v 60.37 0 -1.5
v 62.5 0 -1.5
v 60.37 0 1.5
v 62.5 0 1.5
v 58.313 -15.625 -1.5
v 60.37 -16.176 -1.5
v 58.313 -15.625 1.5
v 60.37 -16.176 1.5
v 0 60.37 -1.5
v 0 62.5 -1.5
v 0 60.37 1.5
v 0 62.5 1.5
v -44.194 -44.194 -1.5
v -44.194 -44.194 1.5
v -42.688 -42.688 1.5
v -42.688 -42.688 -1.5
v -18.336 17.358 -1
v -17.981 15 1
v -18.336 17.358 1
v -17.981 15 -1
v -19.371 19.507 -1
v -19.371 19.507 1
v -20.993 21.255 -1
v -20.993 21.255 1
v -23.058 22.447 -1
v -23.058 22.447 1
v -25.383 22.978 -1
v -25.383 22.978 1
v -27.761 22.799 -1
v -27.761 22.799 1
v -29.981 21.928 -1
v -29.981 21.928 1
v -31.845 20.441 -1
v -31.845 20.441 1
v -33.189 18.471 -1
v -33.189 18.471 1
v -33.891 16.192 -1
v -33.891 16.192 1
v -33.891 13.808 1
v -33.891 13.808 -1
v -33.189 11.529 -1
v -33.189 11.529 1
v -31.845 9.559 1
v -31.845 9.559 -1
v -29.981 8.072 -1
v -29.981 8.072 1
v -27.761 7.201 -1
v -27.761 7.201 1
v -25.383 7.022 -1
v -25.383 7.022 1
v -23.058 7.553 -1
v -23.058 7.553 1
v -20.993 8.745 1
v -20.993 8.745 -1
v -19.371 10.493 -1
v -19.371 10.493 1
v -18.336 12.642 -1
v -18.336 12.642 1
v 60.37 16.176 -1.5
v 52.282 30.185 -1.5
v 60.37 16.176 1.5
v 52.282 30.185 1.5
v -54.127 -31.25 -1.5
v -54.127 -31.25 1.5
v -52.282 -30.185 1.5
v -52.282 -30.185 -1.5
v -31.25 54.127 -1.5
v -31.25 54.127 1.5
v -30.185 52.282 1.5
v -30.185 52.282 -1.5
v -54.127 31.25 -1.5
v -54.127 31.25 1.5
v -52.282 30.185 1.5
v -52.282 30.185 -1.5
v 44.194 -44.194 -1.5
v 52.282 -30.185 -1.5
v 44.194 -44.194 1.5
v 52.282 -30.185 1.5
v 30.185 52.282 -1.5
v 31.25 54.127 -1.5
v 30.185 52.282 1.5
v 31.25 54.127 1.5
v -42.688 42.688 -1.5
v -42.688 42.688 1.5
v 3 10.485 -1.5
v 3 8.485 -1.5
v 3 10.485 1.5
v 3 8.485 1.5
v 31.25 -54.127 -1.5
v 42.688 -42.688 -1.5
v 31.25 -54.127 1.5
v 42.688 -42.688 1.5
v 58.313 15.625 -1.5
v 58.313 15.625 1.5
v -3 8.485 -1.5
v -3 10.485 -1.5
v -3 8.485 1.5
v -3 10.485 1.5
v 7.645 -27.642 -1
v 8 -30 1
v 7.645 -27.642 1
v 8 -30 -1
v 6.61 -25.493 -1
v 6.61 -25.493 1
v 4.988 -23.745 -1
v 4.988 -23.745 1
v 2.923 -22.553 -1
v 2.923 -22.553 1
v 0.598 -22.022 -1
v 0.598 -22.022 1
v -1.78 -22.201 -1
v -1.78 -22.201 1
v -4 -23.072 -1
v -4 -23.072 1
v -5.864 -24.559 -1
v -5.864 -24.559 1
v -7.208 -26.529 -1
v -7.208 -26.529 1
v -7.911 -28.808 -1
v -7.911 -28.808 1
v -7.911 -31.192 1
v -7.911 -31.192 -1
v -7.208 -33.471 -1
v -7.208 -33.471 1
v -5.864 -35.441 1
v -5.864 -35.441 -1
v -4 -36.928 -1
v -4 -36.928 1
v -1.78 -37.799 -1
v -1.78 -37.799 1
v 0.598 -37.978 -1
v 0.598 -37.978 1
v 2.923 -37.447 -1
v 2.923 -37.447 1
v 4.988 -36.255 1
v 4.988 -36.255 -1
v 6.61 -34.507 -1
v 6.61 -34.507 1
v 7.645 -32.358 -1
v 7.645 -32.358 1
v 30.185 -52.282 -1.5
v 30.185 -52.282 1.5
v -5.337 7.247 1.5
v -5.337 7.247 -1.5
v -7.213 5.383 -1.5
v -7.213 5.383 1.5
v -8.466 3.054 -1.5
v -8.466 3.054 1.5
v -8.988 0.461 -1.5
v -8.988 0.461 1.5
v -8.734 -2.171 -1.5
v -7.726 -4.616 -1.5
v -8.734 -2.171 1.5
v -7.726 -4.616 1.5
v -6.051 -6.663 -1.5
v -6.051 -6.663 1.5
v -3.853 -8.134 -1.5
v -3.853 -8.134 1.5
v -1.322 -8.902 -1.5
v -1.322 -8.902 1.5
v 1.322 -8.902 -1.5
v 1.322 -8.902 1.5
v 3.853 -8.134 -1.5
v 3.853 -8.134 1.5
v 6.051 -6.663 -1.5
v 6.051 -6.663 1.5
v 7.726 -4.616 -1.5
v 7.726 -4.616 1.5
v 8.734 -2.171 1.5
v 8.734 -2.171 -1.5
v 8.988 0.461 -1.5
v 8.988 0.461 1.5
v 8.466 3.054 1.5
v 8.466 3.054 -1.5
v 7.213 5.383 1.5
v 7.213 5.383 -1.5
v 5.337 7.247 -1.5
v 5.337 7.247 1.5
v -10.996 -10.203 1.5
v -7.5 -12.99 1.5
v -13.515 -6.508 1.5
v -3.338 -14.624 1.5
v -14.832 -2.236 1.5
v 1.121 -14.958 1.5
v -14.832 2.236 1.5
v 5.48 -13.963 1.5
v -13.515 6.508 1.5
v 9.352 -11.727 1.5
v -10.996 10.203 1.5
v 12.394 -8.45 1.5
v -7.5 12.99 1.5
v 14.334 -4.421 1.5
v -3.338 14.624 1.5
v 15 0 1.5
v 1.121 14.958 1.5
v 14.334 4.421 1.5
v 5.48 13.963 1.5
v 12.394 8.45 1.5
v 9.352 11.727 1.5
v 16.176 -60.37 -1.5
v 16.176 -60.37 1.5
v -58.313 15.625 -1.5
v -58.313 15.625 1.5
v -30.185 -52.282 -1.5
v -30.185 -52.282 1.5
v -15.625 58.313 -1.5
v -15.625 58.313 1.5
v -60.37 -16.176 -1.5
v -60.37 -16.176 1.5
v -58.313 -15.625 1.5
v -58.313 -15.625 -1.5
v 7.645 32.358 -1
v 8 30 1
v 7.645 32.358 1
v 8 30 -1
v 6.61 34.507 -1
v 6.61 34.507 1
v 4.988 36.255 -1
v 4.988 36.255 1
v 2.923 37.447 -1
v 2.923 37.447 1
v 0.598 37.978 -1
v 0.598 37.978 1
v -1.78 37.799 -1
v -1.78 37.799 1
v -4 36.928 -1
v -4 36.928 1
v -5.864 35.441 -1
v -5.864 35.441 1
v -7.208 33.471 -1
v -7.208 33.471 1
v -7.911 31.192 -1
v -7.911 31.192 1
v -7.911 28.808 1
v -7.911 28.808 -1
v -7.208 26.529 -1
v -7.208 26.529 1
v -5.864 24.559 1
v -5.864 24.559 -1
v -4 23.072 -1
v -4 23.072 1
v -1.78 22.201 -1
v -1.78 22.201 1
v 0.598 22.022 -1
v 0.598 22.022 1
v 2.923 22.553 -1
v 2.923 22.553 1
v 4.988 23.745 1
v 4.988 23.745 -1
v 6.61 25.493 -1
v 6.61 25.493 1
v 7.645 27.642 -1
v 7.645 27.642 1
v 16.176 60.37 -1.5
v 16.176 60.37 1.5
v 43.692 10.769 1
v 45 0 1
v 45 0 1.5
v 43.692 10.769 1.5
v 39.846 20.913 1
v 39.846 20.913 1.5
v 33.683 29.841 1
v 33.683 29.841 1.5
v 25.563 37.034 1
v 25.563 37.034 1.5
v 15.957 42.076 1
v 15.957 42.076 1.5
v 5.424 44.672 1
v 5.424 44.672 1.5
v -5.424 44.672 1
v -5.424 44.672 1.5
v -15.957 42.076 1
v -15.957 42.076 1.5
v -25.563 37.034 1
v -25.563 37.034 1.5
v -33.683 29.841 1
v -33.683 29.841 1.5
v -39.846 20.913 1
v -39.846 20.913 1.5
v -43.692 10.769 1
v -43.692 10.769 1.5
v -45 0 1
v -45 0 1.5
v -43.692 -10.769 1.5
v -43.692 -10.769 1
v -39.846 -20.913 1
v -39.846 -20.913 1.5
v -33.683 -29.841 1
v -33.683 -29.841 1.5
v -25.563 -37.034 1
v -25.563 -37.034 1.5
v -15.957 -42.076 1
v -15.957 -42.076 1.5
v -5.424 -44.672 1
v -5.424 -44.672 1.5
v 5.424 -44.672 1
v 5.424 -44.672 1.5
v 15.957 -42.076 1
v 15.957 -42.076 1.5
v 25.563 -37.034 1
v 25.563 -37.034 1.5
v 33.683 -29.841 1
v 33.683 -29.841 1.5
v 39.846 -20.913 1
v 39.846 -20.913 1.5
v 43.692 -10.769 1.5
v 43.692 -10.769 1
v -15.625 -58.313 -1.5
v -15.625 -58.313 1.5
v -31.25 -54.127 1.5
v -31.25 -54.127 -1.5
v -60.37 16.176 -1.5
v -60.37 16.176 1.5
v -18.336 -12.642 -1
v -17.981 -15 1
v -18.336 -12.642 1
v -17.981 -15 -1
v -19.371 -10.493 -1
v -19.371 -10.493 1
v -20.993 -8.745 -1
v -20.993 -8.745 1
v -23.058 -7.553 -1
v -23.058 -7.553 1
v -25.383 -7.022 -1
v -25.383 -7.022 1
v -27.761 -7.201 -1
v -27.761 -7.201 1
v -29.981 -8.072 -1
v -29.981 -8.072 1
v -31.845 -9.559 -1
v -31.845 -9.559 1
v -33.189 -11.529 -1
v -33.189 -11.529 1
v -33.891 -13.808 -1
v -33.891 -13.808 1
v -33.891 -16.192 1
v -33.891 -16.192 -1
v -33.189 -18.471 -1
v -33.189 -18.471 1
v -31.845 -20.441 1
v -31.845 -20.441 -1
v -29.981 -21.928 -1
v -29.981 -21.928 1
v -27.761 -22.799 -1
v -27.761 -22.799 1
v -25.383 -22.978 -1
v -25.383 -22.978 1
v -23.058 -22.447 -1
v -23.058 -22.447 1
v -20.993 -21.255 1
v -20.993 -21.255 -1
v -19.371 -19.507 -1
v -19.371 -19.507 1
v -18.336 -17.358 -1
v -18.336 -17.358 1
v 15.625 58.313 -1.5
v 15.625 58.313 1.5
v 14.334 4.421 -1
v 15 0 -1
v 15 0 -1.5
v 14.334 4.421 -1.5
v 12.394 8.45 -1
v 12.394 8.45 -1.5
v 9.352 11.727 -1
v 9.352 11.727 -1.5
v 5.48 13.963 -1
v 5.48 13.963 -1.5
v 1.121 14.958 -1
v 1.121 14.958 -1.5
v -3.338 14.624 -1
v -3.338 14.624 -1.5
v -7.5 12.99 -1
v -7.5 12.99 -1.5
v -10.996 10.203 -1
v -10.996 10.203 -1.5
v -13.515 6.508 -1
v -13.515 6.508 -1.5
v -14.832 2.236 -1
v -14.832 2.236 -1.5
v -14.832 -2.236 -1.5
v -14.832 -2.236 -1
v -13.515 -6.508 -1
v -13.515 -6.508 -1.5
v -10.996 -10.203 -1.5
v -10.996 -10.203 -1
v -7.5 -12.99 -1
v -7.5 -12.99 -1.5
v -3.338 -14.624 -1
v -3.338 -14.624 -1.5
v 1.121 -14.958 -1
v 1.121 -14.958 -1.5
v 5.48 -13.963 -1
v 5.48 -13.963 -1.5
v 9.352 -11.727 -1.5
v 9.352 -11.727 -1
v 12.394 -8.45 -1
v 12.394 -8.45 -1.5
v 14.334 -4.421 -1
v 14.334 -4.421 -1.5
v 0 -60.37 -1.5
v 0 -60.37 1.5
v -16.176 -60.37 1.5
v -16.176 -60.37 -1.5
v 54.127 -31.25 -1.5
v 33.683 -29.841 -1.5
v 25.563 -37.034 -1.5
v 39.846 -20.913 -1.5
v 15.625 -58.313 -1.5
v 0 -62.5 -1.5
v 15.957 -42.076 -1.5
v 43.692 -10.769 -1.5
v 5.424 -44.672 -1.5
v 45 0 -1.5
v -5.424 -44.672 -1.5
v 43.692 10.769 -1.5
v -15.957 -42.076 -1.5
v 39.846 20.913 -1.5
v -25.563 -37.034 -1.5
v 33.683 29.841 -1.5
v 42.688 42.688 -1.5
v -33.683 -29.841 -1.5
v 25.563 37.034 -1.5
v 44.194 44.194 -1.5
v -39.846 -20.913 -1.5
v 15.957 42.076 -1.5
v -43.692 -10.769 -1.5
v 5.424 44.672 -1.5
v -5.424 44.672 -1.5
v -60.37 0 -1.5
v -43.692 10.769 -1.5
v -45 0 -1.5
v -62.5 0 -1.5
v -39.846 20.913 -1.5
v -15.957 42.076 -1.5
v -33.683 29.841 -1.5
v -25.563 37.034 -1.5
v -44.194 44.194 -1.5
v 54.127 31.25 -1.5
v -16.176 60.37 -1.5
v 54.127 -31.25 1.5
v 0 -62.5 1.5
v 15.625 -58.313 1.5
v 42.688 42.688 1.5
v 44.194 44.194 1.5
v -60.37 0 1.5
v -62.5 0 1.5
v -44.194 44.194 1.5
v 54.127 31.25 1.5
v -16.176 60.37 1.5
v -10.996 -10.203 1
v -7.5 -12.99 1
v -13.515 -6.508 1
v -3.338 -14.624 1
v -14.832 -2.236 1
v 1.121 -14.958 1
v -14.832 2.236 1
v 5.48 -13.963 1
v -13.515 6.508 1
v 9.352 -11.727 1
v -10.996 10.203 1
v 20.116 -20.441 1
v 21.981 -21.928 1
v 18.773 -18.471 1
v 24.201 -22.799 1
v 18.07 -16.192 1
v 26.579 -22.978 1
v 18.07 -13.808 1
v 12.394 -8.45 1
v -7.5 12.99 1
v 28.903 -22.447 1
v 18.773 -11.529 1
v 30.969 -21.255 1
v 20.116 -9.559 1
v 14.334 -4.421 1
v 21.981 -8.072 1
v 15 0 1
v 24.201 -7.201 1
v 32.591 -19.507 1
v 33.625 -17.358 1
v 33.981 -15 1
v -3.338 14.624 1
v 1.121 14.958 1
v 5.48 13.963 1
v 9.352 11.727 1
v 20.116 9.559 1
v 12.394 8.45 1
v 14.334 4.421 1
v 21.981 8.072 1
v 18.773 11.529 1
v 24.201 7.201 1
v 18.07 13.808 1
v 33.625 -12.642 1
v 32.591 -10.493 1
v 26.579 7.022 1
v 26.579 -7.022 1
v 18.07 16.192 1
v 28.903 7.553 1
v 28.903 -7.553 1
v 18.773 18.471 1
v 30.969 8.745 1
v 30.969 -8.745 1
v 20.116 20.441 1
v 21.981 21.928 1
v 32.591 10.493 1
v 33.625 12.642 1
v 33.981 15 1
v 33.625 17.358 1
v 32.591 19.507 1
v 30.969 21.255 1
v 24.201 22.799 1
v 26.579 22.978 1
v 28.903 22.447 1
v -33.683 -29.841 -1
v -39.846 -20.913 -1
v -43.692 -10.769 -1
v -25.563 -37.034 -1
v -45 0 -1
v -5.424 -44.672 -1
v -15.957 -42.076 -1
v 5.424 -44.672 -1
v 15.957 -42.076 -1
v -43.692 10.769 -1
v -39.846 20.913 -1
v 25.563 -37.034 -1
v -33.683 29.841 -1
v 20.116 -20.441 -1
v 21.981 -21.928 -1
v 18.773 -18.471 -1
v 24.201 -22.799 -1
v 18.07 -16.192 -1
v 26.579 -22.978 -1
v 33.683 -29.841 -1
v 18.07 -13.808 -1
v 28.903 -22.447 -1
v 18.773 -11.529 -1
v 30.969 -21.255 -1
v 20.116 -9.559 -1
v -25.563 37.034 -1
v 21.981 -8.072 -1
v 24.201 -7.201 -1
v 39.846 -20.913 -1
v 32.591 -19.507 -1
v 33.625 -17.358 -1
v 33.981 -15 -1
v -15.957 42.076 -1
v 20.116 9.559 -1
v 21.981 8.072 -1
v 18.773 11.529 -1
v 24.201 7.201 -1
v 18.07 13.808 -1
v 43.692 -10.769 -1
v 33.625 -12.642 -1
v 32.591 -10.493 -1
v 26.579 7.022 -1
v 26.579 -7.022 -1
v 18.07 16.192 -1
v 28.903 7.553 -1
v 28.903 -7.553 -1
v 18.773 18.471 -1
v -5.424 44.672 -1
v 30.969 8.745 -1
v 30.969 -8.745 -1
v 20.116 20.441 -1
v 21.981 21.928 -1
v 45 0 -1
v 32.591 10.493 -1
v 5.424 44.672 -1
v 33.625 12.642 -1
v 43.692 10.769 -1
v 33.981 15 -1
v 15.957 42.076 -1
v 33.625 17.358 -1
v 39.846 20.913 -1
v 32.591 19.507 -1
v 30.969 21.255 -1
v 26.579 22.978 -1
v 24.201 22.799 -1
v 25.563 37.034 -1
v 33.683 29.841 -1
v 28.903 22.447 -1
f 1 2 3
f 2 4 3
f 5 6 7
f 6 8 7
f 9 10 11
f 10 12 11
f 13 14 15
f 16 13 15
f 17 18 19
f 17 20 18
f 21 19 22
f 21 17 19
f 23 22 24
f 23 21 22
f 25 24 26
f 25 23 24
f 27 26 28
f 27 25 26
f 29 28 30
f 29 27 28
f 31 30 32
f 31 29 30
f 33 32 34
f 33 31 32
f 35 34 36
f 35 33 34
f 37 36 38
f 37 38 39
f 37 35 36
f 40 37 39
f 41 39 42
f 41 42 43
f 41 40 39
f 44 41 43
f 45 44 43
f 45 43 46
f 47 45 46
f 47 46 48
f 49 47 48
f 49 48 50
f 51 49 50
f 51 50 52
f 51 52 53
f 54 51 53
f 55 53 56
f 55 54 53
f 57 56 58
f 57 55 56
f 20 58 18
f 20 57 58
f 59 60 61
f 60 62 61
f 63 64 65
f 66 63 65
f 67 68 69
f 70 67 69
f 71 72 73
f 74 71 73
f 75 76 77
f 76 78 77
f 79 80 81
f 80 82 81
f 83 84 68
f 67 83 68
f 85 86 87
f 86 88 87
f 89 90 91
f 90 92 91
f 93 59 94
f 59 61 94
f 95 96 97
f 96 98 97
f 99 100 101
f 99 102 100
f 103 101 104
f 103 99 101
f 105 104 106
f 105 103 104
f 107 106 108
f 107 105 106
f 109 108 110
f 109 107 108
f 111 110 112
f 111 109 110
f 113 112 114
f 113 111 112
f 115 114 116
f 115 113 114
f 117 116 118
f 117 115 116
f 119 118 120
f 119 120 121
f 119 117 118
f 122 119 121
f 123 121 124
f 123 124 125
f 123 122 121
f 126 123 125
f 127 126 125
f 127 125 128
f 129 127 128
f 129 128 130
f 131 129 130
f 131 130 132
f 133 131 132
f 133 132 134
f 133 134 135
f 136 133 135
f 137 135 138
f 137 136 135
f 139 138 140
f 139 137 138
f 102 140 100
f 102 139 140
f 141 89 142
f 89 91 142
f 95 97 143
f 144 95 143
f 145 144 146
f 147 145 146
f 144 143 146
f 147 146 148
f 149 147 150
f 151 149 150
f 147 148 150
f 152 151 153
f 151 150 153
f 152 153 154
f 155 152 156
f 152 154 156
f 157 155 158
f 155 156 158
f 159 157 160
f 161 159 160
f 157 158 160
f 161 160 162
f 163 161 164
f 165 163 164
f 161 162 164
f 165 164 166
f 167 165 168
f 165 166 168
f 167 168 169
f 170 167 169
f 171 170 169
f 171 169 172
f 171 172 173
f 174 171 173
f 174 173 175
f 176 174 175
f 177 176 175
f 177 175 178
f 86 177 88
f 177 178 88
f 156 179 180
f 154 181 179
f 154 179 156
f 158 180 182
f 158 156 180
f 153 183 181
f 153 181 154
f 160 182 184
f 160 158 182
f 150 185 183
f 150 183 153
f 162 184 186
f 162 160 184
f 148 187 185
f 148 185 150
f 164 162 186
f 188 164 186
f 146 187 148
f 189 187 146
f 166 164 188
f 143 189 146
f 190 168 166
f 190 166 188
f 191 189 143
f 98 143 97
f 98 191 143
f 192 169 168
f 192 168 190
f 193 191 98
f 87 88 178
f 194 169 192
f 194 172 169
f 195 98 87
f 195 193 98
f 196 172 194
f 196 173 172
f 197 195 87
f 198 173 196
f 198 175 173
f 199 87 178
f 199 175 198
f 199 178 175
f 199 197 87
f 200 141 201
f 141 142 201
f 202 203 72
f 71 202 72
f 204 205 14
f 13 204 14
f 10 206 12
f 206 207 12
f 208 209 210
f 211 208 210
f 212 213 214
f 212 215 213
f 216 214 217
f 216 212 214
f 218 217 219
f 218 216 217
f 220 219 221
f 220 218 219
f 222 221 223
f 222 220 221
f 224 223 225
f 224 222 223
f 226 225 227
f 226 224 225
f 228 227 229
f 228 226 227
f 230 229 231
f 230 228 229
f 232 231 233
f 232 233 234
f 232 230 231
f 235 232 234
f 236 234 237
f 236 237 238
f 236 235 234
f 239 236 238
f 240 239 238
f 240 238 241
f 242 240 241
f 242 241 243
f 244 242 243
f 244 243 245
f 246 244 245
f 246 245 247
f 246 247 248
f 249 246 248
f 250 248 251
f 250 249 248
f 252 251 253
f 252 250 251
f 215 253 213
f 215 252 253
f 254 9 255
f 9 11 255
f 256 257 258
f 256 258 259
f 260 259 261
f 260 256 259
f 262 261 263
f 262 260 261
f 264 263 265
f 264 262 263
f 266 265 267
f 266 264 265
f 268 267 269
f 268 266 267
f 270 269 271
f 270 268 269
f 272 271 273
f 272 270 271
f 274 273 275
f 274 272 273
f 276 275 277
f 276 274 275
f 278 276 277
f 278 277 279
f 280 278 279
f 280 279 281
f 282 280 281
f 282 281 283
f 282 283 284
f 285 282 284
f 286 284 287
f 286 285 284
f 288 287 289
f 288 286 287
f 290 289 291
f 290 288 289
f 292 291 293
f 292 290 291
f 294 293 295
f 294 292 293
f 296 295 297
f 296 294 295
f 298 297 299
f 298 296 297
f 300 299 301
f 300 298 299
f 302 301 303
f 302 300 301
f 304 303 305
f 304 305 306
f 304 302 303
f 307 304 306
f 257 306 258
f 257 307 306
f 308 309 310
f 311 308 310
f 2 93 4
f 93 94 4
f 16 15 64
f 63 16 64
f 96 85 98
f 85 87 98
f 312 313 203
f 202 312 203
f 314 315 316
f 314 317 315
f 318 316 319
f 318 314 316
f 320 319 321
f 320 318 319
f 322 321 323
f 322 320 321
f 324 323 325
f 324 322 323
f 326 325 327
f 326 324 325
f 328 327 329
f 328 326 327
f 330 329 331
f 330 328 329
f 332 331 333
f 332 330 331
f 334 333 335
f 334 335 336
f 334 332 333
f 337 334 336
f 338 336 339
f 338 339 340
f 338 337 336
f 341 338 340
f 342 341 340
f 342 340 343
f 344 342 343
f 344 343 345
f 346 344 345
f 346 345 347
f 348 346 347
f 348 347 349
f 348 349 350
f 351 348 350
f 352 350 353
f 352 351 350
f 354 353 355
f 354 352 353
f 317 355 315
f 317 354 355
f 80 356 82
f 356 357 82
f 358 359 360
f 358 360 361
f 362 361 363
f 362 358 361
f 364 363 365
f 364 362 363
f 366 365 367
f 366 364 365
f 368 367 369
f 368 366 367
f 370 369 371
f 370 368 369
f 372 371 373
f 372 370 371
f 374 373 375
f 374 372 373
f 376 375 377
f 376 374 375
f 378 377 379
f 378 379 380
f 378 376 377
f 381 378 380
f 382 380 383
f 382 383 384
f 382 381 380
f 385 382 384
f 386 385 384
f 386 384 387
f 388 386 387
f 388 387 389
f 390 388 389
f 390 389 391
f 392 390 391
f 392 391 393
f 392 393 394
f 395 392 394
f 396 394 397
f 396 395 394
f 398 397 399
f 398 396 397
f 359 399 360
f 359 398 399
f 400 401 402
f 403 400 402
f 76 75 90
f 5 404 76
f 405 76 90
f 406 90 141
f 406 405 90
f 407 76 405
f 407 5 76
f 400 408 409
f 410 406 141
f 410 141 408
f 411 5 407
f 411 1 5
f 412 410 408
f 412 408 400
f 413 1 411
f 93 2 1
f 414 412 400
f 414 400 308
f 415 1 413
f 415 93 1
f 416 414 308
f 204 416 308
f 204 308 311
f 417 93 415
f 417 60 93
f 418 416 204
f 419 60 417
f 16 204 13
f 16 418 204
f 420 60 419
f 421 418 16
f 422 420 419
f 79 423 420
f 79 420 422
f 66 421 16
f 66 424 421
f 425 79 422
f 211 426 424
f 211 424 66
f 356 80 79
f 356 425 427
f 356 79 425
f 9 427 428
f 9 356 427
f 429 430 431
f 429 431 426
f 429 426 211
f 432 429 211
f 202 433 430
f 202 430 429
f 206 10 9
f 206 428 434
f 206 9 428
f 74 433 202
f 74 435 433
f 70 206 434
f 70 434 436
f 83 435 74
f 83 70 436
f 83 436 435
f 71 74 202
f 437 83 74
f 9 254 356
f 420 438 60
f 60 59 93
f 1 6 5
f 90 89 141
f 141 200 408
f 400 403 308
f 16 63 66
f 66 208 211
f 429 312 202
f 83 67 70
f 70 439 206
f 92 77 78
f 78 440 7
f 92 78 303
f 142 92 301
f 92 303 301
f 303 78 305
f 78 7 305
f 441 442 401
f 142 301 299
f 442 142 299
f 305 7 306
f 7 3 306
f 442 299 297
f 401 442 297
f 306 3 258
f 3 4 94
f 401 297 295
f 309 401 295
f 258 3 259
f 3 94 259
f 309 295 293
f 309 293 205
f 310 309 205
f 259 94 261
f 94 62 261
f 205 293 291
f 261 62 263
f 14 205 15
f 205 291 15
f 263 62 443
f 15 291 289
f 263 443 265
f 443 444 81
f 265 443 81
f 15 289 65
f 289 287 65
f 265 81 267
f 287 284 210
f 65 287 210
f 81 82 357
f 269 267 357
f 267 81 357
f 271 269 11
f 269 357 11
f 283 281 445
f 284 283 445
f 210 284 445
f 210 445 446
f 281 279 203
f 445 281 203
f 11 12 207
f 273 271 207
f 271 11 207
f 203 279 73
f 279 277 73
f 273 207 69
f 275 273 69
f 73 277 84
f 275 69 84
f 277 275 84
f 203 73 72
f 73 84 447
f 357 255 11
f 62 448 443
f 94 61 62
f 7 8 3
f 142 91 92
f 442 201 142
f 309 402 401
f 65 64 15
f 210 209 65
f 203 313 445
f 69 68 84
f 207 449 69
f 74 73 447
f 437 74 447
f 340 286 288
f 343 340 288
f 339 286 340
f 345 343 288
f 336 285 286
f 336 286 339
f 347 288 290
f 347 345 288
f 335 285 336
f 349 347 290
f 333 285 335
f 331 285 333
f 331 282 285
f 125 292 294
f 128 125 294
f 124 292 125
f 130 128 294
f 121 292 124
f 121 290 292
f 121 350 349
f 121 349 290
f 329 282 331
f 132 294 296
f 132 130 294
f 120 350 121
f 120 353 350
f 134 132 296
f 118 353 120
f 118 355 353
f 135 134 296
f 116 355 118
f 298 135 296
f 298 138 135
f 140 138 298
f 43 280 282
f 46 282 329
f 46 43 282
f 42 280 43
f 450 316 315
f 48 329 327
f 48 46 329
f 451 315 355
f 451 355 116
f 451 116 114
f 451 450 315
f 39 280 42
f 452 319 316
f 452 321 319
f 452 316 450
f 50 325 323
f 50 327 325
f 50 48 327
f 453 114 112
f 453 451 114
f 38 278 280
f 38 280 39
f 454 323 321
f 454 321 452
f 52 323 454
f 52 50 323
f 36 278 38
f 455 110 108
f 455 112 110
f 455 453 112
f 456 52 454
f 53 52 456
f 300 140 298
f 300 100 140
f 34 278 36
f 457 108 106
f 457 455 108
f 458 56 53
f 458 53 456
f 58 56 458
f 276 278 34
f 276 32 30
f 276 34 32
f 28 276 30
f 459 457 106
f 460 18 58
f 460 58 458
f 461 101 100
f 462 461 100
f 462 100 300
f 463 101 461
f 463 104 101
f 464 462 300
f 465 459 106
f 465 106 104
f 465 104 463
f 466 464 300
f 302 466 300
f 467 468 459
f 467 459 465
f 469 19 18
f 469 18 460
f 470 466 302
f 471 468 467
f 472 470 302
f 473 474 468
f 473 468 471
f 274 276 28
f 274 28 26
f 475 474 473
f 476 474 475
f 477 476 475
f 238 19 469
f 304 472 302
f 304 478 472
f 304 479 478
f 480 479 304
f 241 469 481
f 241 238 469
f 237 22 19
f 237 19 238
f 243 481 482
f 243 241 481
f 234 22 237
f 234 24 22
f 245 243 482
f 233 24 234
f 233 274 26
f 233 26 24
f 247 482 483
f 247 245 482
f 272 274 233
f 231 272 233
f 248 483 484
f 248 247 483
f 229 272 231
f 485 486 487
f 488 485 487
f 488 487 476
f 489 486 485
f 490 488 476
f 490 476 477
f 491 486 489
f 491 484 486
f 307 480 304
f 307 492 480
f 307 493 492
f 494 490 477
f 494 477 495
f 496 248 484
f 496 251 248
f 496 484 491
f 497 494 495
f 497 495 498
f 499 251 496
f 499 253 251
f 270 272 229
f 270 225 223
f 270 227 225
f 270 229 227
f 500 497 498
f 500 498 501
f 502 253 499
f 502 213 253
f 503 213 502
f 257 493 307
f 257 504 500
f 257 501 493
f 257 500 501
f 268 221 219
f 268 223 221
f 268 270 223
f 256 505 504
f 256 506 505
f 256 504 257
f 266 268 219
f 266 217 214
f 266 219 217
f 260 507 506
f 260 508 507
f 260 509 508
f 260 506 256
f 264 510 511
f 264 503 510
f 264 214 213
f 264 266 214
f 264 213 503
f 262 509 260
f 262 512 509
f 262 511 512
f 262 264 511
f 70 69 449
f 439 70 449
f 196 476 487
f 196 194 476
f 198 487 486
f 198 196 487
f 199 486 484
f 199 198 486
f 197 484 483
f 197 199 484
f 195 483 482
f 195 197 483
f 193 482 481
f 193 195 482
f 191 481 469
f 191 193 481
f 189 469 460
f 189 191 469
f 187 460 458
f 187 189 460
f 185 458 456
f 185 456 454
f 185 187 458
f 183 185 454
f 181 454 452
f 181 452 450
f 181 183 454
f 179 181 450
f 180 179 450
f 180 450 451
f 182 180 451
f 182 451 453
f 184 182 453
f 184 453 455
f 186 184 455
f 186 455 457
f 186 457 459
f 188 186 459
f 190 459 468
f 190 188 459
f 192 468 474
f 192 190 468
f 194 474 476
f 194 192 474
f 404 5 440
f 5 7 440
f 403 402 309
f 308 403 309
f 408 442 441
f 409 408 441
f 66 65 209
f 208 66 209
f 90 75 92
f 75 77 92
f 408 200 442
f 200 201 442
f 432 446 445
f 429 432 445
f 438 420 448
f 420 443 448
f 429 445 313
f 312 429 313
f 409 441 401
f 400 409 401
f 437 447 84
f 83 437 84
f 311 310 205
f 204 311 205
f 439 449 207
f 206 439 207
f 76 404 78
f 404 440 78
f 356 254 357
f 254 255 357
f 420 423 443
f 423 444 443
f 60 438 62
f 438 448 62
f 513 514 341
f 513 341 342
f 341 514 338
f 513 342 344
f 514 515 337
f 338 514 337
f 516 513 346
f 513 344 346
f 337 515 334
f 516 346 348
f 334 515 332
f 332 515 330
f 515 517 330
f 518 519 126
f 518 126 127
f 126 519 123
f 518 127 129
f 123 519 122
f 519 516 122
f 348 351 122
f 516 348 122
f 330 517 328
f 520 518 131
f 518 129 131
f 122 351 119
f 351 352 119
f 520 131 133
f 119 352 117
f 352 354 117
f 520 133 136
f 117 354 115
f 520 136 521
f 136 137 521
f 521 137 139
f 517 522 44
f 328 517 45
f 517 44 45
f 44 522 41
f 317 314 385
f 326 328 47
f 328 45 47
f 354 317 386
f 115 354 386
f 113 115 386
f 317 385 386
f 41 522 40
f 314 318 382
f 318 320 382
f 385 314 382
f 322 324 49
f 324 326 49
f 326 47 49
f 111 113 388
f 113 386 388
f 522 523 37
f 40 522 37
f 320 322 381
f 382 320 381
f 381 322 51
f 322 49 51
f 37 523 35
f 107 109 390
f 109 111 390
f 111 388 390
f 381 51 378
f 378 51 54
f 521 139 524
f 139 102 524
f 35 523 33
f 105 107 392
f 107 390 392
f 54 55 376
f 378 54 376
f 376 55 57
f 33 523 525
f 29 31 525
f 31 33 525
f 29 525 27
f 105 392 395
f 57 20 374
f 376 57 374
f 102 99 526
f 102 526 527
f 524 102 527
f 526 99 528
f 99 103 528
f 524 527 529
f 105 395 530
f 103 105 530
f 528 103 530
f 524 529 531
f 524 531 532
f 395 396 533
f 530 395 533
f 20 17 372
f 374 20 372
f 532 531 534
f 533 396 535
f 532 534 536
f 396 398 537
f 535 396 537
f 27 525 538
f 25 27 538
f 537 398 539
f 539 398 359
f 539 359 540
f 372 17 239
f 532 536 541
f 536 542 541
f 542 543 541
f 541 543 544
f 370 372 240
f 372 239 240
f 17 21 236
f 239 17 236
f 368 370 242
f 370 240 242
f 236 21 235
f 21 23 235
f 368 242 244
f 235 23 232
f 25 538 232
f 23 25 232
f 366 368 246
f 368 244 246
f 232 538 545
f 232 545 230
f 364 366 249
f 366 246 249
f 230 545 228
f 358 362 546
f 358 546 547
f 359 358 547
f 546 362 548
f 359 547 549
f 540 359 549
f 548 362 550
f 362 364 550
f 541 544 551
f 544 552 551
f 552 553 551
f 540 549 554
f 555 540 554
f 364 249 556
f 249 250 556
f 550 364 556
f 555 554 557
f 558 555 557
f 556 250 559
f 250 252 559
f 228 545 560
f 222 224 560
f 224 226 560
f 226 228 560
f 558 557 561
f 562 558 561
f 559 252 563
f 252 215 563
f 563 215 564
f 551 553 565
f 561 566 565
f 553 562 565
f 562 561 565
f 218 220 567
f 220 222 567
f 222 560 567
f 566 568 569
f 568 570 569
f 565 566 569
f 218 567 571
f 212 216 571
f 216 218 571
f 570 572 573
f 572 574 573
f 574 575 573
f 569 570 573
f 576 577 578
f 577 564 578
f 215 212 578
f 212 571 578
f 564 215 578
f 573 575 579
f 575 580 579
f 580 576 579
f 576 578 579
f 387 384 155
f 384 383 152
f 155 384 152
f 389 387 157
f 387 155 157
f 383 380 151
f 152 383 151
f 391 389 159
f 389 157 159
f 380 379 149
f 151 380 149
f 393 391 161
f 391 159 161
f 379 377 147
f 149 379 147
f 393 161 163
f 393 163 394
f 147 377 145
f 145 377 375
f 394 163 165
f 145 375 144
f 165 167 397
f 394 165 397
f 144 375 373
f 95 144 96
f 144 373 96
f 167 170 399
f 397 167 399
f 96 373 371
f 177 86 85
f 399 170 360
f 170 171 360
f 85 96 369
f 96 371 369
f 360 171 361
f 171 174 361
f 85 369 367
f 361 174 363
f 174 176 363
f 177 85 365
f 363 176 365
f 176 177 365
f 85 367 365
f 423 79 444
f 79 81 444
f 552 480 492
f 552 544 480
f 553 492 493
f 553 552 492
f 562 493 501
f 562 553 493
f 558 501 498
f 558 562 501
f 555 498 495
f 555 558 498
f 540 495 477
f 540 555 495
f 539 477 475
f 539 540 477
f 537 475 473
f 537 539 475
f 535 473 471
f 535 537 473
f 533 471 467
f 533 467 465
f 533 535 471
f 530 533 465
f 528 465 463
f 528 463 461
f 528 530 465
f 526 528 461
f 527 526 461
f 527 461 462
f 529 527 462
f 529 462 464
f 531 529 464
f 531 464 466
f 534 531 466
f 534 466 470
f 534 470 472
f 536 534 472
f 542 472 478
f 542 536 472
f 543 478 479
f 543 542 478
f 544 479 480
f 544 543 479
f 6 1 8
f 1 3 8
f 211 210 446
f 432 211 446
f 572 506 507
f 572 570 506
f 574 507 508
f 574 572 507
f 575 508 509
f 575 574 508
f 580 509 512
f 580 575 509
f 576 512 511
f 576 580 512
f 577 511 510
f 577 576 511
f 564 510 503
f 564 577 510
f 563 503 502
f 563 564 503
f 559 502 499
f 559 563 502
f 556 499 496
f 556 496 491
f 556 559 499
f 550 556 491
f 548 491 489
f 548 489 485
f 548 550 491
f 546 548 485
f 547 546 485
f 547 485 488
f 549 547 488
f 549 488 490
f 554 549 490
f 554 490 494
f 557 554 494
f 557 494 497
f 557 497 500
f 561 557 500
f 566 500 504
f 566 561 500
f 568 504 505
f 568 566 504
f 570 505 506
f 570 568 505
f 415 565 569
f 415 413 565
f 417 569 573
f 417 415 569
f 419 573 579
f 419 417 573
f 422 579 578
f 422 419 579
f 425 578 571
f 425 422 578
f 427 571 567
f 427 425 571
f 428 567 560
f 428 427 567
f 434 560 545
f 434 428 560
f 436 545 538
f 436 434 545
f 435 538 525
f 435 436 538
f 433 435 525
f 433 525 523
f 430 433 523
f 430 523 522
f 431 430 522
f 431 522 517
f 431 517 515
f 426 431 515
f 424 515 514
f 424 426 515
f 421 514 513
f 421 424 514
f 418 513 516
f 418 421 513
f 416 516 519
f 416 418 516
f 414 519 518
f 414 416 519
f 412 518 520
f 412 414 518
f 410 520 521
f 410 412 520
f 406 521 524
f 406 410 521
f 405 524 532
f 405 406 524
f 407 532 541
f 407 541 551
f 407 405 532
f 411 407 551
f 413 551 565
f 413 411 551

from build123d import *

# Parameters (mm, degrees)
SKETCH1_R           = 45
BOSS_EXTRUDE2_DEPTH = 1.5
SKETCH1_5_R         = 45
SKETCH1_5_R_2       = 8
SKETCH1_5_R_3       = 15
BOSS_EXTRUDE3_DEPTH = 1
SKETCH1_6_R         = 15
BOSS_EXTRUDE4_DEPTH = 1.5


with BuildPart() as part:
    # Sketch1 → Boss-Extrude2 (new, symmetric)
    with BuildSketch(Plane.XY):
        Polygon((0, 60.370364143), (0, 62.5), (-15.625, 58.313293868), (-16.176190319, 60.370364143), (-30.185182072, 52.282268984), (-31.25, 54.126587737), (-42.688293868, 42.688293868), (-44.194173824, 44.194173824), (-52.282268984, 30.185182072), (-54.126587737, 31.25), (-58.313293868, 15.625), (-60.370364143, 16.176190319), (-60.370364143, 0), (-62.5, 0), (-58.313293868, -15.625), (-60.370364143, -16.176190319), (-52.282268984, -30.185182072), (-54.126587737, -31.25), (-42.688293868, -42.688293868), (-44.194173824, -44.194173824), (-30.185182072, -52.282268984), (-31.25, -54.126587737), (-15.625, -58.313293868), (-16.176190319, -60.370364143), (0, -60.370364143), (0, -62.5), (15.625, -58.313293868), (16.176190319, -60.370364143), (30.185182072, -52.282268984), (31.25, -54.126587737), (42.688293868, -42.688293868), (44.194173824, -44.194173824), (52.282268984, -30.185182072), (54.126587737, -31.25), (58.313293868, -15.625), (60.370364143, -16.176190319), (60.370364143, 0), (62.5, 0), (58.313293868, 15.625), (60.370364143, 16.176190319), (52.282268984, 30.185182072), (54.126587737, 31.25), (42.688293868, 42.688293868), (44.194173824, 44.194173824), (30.185182072, 52.282268984), (31.25, 54.126587737), (15.625, 58.313293868), (16.176190319, 60.370364143), align=None)
        Circle(SKETCH1_R, mode=Mode.SUBTRACT)
    extrude(amount=BOSS_EXTRUDE2_DEPTH, both=True)

    # Sketch1<5> → Boss-Extrude3 (add, symmetric)
    with BuildSketch(Plane.XY):
        Circle(SKETCH1_5_R)
        with Locations((-25.980762114, -15)):
            Circle(SKETCH1_5_R_2, mode=Mode.SUBTRACT)
        with Locations((0, -30)):
            Circle(SKETCH1_5_R_2, mode=Mode.SUBTRACT)
        with Locations((25.980762114, -15)):
            Circle(SKETCH1_5_R_2, mode=Mode.SUBTRACT)
        with Locations((-25.980762114, 15)):
            Circle(SKETCH1_5_R_2, mode=Mode.SUBTRACT)
        Circle(SKETCH1_5_R_3, mode=Mode.SUBTRACT)
        with Locations((25.980762114, 15)):
            Circle(SKETCH1_5_R_2, mode=Mode.SUBTRACT)
        with Locations((0, 30)):
            Circle(SKETCH1_5_R_2, mode=Mode.SUBTRACT)
    extrude(amount=BOSS_EXTRUDE3_DEPTH, both=True)

    # Sketch1<6> → Boss-Extrude4 (add, symmetric)
    with BuildSketch(Plane.XY):
        Circle(SKETCH1_6_R)
        with BuildLine():
            ThreePointArc((3, 8.485281374), (0, -9), (-3, 8.485281374))
            Line((-3, 8.485281374), (-3, 10.485281374))
            Line((-3, 10.485281374), (3, 10.485281374))
            Line((3, 10.485281374), (3, 8.485281374))
        make_face(mode=Mode.SUBTRACT)
    extrude(amount=BOSS_EXTRUDE4_DEPTH, both=True)


solid = part.part
